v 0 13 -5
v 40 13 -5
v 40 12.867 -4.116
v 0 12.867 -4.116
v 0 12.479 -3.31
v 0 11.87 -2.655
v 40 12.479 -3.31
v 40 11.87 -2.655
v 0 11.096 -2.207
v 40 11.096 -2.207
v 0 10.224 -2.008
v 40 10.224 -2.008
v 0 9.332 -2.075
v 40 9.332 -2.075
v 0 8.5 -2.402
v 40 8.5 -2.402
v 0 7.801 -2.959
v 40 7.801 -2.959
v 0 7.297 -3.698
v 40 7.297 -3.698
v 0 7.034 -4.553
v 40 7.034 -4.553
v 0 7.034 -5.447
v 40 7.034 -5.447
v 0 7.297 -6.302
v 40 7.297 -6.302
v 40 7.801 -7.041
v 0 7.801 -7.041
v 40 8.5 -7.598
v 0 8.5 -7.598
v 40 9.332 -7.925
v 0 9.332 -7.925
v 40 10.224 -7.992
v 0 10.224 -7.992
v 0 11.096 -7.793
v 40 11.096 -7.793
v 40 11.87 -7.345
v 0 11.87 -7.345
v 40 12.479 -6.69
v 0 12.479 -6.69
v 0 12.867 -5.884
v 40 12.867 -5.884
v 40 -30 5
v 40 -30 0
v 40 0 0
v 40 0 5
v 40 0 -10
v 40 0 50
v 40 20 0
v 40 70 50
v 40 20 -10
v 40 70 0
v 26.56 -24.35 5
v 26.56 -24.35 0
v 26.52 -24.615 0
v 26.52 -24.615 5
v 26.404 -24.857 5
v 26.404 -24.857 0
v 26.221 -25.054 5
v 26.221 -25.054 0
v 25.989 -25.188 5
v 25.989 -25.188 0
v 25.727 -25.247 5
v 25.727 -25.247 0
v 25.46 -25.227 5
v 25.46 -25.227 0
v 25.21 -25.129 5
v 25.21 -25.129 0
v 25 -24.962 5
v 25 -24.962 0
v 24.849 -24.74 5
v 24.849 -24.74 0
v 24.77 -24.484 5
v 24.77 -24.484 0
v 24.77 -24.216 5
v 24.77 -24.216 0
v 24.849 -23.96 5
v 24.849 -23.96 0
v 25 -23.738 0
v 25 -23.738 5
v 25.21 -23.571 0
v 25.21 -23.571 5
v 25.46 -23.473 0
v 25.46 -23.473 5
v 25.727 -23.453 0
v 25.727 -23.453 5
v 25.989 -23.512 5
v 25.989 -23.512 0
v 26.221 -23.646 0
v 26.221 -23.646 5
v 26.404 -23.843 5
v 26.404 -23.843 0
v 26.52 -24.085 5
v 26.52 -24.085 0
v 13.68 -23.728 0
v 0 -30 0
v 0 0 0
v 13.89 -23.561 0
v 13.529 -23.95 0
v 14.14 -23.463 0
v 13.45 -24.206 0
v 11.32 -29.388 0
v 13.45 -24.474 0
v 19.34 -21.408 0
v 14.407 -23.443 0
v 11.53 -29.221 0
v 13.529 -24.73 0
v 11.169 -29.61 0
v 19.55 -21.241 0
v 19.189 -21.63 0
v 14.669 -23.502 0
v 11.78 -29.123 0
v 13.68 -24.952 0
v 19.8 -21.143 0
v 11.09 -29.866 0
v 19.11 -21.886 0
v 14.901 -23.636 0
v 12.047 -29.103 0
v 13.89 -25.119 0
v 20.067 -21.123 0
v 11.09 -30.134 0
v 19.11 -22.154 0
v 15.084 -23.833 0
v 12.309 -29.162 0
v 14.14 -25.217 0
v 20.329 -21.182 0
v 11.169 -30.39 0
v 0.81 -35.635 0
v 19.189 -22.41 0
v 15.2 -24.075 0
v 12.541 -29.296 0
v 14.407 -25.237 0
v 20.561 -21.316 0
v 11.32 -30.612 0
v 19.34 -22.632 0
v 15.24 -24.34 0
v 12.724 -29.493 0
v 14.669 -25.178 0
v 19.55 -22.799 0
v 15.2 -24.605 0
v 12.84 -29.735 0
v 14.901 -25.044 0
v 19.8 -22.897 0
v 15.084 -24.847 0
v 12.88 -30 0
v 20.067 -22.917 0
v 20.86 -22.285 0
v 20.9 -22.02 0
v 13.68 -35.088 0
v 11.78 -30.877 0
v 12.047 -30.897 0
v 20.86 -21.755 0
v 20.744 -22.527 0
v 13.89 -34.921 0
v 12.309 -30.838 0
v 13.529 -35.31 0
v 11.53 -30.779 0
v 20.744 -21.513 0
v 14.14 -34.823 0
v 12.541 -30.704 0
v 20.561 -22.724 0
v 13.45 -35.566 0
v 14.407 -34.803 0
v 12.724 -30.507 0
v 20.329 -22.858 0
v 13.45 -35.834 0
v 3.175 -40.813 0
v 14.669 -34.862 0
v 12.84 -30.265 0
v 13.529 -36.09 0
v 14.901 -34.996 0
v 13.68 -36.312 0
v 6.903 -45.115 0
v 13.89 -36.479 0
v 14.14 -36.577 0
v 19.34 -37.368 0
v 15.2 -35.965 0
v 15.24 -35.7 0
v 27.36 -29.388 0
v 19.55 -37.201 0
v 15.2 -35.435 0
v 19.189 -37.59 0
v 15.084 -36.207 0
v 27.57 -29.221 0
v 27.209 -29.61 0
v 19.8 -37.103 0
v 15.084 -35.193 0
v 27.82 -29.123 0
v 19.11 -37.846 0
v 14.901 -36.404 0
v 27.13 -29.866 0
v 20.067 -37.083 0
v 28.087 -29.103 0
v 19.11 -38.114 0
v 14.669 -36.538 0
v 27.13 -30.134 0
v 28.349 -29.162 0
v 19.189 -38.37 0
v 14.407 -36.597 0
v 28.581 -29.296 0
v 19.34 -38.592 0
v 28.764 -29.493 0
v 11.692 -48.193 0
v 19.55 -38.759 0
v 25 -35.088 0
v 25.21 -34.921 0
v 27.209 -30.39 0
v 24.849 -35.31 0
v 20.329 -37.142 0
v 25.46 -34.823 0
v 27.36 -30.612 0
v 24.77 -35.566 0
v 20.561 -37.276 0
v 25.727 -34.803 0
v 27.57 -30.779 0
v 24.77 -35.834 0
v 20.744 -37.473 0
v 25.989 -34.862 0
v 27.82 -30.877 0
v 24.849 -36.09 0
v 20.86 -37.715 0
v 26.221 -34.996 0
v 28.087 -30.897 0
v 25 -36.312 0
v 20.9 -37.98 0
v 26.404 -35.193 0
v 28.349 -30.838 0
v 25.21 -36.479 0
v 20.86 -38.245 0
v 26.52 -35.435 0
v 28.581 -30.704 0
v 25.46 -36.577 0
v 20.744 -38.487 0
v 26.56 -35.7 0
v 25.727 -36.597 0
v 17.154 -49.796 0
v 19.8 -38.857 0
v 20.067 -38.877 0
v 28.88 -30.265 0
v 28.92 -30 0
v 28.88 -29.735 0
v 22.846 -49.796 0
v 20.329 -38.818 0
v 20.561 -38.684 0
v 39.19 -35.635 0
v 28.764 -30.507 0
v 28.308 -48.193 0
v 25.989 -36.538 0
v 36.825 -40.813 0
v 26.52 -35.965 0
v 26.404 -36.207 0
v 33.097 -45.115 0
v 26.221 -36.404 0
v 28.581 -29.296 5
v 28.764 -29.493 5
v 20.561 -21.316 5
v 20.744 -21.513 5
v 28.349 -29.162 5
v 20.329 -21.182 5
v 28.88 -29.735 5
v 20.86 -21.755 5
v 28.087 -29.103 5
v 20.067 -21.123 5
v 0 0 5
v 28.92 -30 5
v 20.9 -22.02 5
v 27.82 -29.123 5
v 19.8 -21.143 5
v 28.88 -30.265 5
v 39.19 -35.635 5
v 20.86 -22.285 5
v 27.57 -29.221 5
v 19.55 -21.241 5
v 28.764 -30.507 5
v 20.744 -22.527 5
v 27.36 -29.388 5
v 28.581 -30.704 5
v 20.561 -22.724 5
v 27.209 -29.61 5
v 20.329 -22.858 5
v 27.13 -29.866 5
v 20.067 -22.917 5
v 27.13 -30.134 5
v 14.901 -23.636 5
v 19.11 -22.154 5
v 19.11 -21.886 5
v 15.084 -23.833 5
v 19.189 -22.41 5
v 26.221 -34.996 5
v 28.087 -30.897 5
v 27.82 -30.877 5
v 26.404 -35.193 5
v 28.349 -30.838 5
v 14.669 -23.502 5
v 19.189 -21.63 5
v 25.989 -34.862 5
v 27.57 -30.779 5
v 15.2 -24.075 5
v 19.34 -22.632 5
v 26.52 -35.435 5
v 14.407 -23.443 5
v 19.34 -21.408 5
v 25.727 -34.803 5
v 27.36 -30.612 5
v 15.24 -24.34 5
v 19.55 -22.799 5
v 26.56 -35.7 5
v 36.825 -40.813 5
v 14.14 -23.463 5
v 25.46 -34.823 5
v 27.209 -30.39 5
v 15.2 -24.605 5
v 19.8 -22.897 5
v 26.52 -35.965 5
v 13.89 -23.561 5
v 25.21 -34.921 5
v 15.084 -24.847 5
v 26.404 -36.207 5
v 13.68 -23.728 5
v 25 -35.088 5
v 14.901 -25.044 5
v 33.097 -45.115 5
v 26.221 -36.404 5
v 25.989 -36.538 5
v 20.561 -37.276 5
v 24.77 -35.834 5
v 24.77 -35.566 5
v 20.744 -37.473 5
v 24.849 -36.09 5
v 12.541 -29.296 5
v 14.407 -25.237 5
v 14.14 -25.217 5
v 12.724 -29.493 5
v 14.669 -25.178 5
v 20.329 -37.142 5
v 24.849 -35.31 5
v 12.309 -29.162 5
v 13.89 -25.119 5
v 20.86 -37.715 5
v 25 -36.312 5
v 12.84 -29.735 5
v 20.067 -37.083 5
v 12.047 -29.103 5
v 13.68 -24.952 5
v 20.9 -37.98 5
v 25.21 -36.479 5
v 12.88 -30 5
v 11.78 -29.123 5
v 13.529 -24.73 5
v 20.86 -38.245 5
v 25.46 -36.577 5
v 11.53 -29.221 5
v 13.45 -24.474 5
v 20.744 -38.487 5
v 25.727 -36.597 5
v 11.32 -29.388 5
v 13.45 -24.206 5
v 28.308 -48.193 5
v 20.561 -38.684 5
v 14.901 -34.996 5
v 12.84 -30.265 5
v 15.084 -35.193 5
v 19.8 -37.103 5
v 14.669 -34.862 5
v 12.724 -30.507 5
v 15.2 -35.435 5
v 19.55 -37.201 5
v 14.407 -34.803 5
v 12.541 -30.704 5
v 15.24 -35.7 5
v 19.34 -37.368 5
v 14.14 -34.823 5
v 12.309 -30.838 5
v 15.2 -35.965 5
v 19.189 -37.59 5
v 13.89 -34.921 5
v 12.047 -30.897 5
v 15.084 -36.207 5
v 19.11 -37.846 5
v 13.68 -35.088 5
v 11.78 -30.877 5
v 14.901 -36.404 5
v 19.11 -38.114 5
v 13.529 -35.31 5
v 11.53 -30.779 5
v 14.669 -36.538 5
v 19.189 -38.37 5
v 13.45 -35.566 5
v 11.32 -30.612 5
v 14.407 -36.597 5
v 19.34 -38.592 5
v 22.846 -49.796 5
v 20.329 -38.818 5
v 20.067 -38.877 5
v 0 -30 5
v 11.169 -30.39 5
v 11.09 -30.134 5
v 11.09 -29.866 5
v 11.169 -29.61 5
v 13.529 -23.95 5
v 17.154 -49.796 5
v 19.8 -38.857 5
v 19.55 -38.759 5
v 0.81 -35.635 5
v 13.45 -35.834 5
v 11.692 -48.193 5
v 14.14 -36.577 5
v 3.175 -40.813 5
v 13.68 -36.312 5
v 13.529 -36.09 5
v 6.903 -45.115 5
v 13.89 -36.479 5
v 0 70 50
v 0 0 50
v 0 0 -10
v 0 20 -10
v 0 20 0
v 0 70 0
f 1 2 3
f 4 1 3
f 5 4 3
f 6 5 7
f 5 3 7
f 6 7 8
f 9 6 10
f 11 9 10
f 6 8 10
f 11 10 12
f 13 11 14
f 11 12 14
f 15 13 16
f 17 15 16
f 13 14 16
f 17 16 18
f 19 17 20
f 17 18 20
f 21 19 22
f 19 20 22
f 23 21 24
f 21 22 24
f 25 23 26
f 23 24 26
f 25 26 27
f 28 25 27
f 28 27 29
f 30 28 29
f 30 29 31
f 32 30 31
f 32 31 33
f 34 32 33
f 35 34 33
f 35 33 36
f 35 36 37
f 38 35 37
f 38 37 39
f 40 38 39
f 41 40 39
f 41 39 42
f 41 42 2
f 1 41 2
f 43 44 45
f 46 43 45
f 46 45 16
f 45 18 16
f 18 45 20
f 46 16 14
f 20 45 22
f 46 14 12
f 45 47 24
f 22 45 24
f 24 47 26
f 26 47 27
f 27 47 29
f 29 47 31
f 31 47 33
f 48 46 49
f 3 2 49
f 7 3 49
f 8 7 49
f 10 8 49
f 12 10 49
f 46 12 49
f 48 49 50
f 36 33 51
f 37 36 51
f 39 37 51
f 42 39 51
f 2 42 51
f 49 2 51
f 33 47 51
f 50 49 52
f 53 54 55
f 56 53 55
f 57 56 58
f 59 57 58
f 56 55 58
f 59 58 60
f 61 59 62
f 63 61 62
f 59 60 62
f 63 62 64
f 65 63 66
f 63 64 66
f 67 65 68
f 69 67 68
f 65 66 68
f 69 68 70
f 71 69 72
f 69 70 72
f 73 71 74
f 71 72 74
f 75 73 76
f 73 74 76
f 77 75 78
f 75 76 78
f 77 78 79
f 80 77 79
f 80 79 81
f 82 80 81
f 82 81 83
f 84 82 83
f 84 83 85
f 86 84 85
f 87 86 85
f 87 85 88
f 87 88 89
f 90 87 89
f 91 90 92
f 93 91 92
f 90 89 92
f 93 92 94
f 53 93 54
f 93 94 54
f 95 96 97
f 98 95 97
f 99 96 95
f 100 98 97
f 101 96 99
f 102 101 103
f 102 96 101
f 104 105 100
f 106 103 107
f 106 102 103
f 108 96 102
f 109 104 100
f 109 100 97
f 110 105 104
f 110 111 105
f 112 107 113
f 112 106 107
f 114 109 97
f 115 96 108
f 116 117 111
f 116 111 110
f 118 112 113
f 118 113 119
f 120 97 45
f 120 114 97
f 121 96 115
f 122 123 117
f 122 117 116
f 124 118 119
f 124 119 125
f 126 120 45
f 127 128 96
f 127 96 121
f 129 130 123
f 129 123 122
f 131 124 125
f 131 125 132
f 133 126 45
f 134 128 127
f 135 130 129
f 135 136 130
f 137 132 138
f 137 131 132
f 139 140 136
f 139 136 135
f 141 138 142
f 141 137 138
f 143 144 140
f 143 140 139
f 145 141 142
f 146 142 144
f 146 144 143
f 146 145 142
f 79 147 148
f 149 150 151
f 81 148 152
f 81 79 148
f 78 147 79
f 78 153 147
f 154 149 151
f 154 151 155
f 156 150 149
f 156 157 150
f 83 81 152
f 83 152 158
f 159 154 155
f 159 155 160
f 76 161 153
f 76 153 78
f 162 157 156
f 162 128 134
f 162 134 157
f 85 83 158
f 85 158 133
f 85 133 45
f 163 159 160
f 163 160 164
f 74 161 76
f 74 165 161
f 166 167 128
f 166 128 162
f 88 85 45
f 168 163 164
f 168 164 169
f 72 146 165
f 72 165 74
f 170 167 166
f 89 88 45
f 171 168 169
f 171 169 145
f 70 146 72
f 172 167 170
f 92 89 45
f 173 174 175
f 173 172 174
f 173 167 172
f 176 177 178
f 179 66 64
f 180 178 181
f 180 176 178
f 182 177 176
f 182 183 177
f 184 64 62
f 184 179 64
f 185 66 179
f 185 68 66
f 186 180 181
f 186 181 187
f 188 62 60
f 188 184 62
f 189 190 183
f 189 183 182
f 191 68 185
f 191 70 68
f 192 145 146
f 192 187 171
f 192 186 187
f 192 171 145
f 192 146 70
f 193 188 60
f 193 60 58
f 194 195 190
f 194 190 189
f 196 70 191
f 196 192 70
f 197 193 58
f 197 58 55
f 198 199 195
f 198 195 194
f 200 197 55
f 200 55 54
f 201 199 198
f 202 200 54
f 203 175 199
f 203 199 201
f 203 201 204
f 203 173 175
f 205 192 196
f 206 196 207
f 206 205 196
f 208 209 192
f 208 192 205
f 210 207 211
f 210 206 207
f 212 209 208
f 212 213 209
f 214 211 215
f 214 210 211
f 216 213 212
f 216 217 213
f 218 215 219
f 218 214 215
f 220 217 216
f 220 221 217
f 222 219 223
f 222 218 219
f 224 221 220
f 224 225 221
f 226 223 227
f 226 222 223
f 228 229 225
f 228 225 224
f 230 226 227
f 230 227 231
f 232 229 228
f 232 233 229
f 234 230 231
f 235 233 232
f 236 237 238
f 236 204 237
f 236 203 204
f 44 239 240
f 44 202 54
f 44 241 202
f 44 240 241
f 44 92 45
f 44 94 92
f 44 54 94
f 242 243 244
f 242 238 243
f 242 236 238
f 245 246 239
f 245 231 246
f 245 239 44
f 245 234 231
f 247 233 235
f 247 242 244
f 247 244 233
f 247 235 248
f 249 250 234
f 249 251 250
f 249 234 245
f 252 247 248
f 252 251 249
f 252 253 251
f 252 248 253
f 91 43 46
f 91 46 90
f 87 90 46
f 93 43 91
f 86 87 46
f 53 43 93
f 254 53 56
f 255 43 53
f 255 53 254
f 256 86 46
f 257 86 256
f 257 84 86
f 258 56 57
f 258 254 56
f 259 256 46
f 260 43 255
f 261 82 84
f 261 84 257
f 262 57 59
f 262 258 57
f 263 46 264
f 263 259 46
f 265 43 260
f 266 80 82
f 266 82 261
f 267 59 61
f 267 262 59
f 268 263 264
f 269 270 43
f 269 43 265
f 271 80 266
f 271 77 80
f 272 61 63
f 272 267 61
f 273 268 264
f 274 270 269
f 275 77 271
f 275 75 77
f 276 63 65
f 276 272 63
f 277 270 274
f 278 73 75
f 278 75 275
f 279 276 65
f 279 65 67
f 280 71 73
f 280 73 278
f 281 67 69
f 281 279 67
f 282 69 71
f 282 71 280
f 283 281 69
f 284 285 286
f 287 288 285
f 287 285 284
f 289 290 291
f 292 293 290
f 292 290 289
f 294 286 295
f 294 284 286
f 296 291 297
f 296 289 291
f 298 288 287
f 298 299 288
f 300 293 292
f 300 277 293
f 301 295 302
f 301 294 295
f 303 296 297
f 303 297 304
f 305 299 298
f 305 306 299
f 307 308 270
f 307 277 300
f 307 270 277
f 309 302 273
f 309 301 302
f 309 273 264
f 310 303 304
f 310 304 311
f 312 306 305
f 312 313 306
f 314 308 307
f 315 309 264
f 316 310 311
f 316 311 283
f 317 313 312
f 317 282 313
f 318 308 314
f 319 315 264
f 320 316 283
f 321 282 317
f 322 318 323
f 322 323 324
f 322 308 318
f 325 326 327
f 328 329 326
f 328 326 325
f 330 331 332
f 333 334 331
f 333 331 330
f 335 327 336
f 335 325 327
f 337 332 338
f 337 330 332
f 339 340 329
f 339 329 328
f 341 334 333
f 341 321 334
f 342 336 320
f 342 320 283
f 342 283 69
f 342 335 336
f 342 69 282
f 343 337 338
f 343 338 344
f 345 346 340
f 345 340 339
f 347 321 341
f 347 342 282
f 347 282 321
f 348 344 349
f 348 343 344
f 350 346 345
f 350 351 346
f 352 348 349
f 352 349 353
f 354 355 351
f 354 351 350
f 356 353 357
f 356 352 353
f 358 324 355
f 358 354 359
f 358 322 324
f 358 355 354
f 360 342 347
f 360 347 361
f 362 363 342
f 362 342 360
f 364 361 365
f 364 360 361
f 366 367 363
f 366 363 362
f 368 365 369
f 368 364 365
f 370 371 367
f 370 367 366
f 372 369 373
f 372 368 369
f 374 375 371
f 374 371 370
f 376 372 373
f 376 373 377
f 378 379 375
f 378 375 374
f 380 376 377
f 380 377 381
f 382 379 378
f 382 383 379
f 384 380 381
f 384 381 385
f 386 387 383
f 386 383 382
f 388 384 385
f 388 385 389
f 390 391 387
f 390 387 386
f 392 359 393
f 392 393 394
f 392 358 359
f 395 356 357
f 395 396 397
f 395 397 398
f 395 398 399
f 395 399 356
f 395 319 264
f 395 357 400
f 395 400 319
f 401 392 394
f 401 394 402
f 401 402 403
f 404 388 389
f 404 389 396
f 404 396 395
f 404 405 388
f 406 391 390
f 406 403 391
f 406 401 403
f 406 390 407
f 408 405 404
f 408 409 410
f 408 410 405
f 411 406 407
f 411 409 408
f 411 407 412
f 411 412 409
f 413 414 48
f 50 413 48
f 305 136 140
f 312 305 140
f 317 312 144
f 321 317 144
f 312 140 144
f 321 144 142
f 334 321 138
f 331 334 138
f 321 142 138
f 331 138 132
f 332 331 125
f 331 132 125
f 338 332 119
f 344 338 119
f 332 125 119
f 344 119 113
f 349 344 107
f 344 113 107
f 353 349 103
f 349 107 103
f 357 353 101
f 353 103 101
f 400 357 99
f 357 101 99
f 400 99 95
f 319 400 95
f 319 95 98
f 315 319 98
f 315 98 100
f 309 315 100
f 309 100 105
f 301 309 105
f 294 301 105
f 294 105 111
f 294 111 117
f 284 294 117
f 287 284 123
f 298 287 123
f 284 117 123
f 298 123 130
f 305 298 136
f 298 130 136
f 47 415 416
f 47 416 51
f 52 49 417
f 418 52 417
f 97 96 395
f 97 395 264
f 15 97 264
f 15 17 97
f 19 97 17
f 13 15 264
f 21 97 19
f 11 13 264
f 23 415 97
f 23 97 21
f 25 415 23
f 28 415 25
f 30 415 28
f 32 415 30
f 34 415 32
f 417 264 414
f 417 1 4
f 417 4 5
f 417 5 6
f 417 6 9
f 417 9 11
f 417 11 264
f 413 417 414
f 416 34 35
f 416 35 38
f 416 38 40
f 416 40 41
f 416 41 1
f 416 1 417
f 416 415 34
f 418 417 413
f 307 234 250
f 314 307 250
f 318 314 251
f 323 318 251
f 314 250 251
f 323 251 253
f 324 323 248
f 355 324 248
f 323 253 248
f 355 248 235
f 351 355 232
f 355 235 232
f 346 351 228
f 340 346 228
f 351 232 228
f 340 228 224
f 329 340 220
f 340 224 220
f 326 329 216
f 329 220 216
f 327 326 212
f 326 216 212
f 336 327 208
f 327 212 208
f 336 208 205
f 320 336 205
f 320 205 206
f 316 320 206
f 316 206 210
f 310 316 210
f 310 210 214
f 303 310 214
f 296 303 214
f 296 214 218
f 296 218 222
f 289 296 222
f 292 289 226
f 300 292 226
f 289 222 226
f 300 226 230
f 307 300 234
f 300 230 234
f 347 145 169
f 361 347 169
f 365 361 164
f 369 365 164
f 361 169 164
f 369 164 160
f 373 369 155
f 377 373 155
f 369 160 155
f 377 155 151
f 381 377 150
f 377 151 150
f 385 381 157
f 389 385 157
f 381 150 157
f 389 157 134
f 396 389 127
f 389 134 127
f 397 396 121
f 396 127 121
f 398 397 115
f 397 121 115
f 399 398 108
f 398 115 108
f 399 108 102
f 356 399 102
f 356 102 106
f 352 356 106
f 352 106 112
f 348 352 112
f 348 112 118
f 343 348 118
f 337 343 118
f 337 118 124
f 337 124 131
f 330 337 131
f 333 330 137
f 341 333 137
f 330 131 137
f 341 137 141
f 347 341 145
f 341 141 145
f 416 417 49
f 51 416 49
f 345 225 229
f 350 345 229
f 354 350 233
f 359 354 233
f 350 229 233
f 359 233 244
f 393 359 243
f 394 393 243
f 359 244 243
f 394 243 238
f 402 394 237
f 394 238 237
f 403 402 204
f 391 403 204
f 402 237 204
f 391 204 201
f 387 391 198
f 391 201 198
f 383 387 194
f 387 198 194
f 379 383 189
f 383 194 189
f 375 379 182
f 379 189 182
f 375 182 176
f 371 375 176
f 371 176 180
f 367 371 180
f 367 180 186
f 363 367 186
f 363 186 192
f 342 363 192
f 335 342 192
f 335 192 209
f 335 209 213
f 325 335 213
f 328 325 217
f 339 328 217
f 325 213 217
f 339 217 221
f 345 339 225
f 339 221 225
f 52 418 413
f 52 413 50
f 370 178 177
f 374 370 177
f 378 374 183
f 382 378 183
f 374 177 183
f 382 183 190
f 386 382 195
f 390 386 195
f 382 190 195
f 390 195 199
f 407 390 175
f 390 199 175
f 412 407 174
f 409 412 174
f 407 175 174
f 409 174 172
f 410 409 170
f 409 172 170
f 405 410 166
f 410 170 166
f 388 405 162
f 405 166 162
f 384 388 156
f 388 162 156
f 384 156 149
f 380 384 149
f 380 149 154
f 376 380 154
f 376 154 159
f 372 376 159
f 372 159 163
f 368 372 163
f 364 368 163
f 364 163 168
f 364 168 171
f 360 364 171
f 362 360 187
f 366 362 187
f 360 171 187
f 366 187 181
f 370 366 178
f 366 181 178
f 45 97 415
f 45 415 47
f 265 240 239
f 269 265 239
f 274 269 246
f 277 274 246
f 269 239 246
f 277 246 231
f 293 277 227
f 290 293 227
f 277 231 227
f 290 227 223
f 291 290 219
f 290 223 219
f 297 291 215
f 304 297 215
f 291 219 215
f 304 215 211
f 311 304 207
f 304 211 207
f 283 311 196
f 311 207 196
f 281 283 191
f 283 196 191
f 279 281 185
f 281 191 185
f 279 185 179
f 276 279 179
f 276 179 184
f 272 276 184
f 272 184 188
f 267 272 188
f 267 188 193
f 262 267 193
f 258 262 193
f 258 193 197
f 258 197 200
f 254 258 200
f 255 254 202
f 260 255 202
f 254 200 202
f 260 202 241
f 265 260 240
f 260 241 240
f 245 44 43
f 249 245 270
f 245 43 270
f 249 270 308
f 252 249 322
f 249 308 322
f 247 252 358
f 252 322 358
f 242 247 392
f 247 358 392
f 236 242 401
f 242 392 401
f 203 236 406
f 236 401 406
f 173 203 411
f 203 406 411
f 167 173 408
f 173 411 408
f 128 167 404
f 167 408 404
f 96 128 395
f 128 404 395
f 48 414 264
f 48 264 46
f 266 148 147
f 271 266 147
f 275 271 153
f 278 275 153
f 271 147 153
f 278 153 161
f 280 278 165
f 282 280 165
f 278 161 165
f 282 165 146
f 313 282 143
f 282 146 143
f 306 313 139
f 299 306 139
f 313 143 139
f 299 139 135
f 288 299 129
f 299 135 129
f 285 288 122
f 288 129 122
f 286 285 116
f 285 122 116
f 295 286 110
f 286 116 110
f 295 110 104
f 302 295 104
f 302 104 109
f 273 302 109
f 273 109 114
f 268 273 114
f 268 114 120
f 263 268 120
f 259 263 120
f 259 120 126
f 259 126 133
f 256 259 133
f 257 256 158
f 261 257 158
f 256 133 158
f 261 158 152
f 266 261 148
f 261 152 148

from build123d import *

# Parameters (mm, degrees)
SKETCH_W        = 29
SKETCH_H        = 47
PAD_DEPTH       = 40
SKETCH001_R     = 9.75
PAD001_DEPTH    = 10
SKETCH002_W     = 56
SKETCH002_H     = 6
POCKET_DEPTH    = 100
POCKET001_DEPTH = 5
SKETCH005_R     = 0.9
POCKET002_DEPTH = 5
SKETCH006_W     = 40
SKETCH006_H     = 20
PAD002_DEPTH    = 10
SKETCH007_R     = 3
HOLE_DEPTH      = 50
SKETCH008_W     = 40
SKETCH008_H     = 45
POCKET003_DEPTH = 68.991653
SKETCH009_W     = 40
SKETCH009_H     = 5
PAD003_DEPTH    = 50
SKETCH010_W     = 40
SKETCH010_H     = 70
PAD004_DEPTH    = 45


with BuildPart() as part:
    # Sketch → Pad (new body)
    with BuildSketch(Plane.XY.offset(10)):
        with BuildLine():
            Line((0, 0), (40, 0))
            Line((40, 0), (40, 60))
            ThreePointArc((40, 60), (20, 68.990653), (0, 60))
            Line((0, 60), (0, 0))
        make_face()
        with Locations((20, 30)):
            Rectangle(SKETCH_W, SKETCH_H, mode=Mode.SUBTRACT)
    extrude(amount=PAD_DEPTH)

    # Sketch001 (on Face9 of Pad) → Pad001 (join)
    with BuildSketch(Plane(origin=(0, 0, 10), x_dir=(1, 0, 0), z_dir=(0, 0, -1))):
        with BuildLine():
            Line((40, -60), (40, 30))
            ThreePointArc((40, 30), (20, 50), (0, 30))
            Line((0, 30), (0, -60))
            ThreePointArc((0, -60), (20, -68.990653), (40, -60))
        make_face()
        with Locations((20, -42.25)):
            Circle(SKETCH001_R, mode=Mode.SUBTRACT)
    extrude(amount=PAD001_DEPTH)

    # Sketch002 (on Face7 of Pad001) → Pocket (cut)
    with BuildSketch(Plane(origin=(0, 0, 0), x_dir=(0, -1, 0), z_dir=(-1, 0, 0))):
        with Locations((-48, 3)):
            Rectangle(SKETCH002_W, SKETCH002_H)
    extrude(amount=-POCKET_DEPTH, mode=Mode.SUBTRACT)

    # Sketch003 (on Face4 of Pocket) → Pocket001 (cut)
    with BuildSketch(Plane.XY.offset(10)):
        with BuildLine():
            Line((0, 0), (40, 0))
            Line((40, 0), (40, -30))
            ThreePointArc((0, -30), (20, -50), (40, -30))
            Line((0, -30), (0, 0))
        make_face()
    extrude(amount=-POCKET001_DEPTH, mode=Mode.SUBTRACT)

    # Sketch005 → Pocket002 (cut)
    with BuildSketch(Plane(origin=(0, 0, 0), x_dir=(1, 0, 0), z_dir=(0, 0, -1))):
        with Locations((11.98, 30)):
            Circle(SKETCH005_R)
        with Locations((14.34, 35.7)):
            Circle(SKETCH005_R)
        with Locations((20, 37.98)):
            Circle(SKETCH005_R)
        with Locations((25.66, 35.7)):
            Circle(SKETCH005_R)
        with Locations((28.02, 30)):
            Circle(SKETCH005_R)
        with Locations((25.66, 24.35)):
            Circle(SKETCH005_R)
        with Locations((20, 22.02)):
            Circle(SKETCH005_R)
        with Locations((14.34, 24.34)):
            Circle(SKETCH005_R)
    extrude(amount=-POCKET002_DEPTH, mode=Mode.SUBTRACT)

    # Sketch006 (on Face17 of Pocket002) → Pad002 (join)
    with BuildSketch(Plane(origin=(0, 0, 0), x_dir=(1, 0, 0), z_dir=(0, 0, -1))):
        with Locations((20, -10)):
            Rectangle(SKETCH006_W, SKETCH006_H)
    extrude(amount=PAD002_DEPTH)

    # Sketch007 → Hole (cut)
    with BuildSketch(Plane.YZ.offset(40)):
        with Locations((10, -5)):
            Circle(SKETCH007_R)
    extrude(amount=-HOLE_DEPTH, mode=Mode.SUBTRACT)

    # Sketch008 (on Face1 of Hole) → Pocket003 (cut, through all)
    with BuildSketch(Plane.XZ):
        with Locations((20, 27.5)):
            Rectangle(SKETCH008_W, SKETCH008_H)
    extrude(amount=-POCKET003_DEPTH, mode=Mode.SUBTRACT)

    # Sketch009 (on Face14 of Pocket003) → Pad003 (join)
    with BuildSketch(Plane(origin=(0, 20, 0), x_dir=(-1, 0, 0), z_dir=(0, 1, 0))):
        with Locations((-20, 2.5)):
            Rectangle(SKETCH009_W, SKETCH009_H)
    extrude(amount=PAD003_DEPTH)

    # Sketch010 (on Face2 of Pad003) → Pad004 (join)
    with BuildSketch(Plane.XY.offset(5)):
        with Locations((20, 35)):
            Rectangle(SKETCH010_W, SKETCH010_H)
    extrude(amount=PAD004_DEPTH)


solid = part.part
